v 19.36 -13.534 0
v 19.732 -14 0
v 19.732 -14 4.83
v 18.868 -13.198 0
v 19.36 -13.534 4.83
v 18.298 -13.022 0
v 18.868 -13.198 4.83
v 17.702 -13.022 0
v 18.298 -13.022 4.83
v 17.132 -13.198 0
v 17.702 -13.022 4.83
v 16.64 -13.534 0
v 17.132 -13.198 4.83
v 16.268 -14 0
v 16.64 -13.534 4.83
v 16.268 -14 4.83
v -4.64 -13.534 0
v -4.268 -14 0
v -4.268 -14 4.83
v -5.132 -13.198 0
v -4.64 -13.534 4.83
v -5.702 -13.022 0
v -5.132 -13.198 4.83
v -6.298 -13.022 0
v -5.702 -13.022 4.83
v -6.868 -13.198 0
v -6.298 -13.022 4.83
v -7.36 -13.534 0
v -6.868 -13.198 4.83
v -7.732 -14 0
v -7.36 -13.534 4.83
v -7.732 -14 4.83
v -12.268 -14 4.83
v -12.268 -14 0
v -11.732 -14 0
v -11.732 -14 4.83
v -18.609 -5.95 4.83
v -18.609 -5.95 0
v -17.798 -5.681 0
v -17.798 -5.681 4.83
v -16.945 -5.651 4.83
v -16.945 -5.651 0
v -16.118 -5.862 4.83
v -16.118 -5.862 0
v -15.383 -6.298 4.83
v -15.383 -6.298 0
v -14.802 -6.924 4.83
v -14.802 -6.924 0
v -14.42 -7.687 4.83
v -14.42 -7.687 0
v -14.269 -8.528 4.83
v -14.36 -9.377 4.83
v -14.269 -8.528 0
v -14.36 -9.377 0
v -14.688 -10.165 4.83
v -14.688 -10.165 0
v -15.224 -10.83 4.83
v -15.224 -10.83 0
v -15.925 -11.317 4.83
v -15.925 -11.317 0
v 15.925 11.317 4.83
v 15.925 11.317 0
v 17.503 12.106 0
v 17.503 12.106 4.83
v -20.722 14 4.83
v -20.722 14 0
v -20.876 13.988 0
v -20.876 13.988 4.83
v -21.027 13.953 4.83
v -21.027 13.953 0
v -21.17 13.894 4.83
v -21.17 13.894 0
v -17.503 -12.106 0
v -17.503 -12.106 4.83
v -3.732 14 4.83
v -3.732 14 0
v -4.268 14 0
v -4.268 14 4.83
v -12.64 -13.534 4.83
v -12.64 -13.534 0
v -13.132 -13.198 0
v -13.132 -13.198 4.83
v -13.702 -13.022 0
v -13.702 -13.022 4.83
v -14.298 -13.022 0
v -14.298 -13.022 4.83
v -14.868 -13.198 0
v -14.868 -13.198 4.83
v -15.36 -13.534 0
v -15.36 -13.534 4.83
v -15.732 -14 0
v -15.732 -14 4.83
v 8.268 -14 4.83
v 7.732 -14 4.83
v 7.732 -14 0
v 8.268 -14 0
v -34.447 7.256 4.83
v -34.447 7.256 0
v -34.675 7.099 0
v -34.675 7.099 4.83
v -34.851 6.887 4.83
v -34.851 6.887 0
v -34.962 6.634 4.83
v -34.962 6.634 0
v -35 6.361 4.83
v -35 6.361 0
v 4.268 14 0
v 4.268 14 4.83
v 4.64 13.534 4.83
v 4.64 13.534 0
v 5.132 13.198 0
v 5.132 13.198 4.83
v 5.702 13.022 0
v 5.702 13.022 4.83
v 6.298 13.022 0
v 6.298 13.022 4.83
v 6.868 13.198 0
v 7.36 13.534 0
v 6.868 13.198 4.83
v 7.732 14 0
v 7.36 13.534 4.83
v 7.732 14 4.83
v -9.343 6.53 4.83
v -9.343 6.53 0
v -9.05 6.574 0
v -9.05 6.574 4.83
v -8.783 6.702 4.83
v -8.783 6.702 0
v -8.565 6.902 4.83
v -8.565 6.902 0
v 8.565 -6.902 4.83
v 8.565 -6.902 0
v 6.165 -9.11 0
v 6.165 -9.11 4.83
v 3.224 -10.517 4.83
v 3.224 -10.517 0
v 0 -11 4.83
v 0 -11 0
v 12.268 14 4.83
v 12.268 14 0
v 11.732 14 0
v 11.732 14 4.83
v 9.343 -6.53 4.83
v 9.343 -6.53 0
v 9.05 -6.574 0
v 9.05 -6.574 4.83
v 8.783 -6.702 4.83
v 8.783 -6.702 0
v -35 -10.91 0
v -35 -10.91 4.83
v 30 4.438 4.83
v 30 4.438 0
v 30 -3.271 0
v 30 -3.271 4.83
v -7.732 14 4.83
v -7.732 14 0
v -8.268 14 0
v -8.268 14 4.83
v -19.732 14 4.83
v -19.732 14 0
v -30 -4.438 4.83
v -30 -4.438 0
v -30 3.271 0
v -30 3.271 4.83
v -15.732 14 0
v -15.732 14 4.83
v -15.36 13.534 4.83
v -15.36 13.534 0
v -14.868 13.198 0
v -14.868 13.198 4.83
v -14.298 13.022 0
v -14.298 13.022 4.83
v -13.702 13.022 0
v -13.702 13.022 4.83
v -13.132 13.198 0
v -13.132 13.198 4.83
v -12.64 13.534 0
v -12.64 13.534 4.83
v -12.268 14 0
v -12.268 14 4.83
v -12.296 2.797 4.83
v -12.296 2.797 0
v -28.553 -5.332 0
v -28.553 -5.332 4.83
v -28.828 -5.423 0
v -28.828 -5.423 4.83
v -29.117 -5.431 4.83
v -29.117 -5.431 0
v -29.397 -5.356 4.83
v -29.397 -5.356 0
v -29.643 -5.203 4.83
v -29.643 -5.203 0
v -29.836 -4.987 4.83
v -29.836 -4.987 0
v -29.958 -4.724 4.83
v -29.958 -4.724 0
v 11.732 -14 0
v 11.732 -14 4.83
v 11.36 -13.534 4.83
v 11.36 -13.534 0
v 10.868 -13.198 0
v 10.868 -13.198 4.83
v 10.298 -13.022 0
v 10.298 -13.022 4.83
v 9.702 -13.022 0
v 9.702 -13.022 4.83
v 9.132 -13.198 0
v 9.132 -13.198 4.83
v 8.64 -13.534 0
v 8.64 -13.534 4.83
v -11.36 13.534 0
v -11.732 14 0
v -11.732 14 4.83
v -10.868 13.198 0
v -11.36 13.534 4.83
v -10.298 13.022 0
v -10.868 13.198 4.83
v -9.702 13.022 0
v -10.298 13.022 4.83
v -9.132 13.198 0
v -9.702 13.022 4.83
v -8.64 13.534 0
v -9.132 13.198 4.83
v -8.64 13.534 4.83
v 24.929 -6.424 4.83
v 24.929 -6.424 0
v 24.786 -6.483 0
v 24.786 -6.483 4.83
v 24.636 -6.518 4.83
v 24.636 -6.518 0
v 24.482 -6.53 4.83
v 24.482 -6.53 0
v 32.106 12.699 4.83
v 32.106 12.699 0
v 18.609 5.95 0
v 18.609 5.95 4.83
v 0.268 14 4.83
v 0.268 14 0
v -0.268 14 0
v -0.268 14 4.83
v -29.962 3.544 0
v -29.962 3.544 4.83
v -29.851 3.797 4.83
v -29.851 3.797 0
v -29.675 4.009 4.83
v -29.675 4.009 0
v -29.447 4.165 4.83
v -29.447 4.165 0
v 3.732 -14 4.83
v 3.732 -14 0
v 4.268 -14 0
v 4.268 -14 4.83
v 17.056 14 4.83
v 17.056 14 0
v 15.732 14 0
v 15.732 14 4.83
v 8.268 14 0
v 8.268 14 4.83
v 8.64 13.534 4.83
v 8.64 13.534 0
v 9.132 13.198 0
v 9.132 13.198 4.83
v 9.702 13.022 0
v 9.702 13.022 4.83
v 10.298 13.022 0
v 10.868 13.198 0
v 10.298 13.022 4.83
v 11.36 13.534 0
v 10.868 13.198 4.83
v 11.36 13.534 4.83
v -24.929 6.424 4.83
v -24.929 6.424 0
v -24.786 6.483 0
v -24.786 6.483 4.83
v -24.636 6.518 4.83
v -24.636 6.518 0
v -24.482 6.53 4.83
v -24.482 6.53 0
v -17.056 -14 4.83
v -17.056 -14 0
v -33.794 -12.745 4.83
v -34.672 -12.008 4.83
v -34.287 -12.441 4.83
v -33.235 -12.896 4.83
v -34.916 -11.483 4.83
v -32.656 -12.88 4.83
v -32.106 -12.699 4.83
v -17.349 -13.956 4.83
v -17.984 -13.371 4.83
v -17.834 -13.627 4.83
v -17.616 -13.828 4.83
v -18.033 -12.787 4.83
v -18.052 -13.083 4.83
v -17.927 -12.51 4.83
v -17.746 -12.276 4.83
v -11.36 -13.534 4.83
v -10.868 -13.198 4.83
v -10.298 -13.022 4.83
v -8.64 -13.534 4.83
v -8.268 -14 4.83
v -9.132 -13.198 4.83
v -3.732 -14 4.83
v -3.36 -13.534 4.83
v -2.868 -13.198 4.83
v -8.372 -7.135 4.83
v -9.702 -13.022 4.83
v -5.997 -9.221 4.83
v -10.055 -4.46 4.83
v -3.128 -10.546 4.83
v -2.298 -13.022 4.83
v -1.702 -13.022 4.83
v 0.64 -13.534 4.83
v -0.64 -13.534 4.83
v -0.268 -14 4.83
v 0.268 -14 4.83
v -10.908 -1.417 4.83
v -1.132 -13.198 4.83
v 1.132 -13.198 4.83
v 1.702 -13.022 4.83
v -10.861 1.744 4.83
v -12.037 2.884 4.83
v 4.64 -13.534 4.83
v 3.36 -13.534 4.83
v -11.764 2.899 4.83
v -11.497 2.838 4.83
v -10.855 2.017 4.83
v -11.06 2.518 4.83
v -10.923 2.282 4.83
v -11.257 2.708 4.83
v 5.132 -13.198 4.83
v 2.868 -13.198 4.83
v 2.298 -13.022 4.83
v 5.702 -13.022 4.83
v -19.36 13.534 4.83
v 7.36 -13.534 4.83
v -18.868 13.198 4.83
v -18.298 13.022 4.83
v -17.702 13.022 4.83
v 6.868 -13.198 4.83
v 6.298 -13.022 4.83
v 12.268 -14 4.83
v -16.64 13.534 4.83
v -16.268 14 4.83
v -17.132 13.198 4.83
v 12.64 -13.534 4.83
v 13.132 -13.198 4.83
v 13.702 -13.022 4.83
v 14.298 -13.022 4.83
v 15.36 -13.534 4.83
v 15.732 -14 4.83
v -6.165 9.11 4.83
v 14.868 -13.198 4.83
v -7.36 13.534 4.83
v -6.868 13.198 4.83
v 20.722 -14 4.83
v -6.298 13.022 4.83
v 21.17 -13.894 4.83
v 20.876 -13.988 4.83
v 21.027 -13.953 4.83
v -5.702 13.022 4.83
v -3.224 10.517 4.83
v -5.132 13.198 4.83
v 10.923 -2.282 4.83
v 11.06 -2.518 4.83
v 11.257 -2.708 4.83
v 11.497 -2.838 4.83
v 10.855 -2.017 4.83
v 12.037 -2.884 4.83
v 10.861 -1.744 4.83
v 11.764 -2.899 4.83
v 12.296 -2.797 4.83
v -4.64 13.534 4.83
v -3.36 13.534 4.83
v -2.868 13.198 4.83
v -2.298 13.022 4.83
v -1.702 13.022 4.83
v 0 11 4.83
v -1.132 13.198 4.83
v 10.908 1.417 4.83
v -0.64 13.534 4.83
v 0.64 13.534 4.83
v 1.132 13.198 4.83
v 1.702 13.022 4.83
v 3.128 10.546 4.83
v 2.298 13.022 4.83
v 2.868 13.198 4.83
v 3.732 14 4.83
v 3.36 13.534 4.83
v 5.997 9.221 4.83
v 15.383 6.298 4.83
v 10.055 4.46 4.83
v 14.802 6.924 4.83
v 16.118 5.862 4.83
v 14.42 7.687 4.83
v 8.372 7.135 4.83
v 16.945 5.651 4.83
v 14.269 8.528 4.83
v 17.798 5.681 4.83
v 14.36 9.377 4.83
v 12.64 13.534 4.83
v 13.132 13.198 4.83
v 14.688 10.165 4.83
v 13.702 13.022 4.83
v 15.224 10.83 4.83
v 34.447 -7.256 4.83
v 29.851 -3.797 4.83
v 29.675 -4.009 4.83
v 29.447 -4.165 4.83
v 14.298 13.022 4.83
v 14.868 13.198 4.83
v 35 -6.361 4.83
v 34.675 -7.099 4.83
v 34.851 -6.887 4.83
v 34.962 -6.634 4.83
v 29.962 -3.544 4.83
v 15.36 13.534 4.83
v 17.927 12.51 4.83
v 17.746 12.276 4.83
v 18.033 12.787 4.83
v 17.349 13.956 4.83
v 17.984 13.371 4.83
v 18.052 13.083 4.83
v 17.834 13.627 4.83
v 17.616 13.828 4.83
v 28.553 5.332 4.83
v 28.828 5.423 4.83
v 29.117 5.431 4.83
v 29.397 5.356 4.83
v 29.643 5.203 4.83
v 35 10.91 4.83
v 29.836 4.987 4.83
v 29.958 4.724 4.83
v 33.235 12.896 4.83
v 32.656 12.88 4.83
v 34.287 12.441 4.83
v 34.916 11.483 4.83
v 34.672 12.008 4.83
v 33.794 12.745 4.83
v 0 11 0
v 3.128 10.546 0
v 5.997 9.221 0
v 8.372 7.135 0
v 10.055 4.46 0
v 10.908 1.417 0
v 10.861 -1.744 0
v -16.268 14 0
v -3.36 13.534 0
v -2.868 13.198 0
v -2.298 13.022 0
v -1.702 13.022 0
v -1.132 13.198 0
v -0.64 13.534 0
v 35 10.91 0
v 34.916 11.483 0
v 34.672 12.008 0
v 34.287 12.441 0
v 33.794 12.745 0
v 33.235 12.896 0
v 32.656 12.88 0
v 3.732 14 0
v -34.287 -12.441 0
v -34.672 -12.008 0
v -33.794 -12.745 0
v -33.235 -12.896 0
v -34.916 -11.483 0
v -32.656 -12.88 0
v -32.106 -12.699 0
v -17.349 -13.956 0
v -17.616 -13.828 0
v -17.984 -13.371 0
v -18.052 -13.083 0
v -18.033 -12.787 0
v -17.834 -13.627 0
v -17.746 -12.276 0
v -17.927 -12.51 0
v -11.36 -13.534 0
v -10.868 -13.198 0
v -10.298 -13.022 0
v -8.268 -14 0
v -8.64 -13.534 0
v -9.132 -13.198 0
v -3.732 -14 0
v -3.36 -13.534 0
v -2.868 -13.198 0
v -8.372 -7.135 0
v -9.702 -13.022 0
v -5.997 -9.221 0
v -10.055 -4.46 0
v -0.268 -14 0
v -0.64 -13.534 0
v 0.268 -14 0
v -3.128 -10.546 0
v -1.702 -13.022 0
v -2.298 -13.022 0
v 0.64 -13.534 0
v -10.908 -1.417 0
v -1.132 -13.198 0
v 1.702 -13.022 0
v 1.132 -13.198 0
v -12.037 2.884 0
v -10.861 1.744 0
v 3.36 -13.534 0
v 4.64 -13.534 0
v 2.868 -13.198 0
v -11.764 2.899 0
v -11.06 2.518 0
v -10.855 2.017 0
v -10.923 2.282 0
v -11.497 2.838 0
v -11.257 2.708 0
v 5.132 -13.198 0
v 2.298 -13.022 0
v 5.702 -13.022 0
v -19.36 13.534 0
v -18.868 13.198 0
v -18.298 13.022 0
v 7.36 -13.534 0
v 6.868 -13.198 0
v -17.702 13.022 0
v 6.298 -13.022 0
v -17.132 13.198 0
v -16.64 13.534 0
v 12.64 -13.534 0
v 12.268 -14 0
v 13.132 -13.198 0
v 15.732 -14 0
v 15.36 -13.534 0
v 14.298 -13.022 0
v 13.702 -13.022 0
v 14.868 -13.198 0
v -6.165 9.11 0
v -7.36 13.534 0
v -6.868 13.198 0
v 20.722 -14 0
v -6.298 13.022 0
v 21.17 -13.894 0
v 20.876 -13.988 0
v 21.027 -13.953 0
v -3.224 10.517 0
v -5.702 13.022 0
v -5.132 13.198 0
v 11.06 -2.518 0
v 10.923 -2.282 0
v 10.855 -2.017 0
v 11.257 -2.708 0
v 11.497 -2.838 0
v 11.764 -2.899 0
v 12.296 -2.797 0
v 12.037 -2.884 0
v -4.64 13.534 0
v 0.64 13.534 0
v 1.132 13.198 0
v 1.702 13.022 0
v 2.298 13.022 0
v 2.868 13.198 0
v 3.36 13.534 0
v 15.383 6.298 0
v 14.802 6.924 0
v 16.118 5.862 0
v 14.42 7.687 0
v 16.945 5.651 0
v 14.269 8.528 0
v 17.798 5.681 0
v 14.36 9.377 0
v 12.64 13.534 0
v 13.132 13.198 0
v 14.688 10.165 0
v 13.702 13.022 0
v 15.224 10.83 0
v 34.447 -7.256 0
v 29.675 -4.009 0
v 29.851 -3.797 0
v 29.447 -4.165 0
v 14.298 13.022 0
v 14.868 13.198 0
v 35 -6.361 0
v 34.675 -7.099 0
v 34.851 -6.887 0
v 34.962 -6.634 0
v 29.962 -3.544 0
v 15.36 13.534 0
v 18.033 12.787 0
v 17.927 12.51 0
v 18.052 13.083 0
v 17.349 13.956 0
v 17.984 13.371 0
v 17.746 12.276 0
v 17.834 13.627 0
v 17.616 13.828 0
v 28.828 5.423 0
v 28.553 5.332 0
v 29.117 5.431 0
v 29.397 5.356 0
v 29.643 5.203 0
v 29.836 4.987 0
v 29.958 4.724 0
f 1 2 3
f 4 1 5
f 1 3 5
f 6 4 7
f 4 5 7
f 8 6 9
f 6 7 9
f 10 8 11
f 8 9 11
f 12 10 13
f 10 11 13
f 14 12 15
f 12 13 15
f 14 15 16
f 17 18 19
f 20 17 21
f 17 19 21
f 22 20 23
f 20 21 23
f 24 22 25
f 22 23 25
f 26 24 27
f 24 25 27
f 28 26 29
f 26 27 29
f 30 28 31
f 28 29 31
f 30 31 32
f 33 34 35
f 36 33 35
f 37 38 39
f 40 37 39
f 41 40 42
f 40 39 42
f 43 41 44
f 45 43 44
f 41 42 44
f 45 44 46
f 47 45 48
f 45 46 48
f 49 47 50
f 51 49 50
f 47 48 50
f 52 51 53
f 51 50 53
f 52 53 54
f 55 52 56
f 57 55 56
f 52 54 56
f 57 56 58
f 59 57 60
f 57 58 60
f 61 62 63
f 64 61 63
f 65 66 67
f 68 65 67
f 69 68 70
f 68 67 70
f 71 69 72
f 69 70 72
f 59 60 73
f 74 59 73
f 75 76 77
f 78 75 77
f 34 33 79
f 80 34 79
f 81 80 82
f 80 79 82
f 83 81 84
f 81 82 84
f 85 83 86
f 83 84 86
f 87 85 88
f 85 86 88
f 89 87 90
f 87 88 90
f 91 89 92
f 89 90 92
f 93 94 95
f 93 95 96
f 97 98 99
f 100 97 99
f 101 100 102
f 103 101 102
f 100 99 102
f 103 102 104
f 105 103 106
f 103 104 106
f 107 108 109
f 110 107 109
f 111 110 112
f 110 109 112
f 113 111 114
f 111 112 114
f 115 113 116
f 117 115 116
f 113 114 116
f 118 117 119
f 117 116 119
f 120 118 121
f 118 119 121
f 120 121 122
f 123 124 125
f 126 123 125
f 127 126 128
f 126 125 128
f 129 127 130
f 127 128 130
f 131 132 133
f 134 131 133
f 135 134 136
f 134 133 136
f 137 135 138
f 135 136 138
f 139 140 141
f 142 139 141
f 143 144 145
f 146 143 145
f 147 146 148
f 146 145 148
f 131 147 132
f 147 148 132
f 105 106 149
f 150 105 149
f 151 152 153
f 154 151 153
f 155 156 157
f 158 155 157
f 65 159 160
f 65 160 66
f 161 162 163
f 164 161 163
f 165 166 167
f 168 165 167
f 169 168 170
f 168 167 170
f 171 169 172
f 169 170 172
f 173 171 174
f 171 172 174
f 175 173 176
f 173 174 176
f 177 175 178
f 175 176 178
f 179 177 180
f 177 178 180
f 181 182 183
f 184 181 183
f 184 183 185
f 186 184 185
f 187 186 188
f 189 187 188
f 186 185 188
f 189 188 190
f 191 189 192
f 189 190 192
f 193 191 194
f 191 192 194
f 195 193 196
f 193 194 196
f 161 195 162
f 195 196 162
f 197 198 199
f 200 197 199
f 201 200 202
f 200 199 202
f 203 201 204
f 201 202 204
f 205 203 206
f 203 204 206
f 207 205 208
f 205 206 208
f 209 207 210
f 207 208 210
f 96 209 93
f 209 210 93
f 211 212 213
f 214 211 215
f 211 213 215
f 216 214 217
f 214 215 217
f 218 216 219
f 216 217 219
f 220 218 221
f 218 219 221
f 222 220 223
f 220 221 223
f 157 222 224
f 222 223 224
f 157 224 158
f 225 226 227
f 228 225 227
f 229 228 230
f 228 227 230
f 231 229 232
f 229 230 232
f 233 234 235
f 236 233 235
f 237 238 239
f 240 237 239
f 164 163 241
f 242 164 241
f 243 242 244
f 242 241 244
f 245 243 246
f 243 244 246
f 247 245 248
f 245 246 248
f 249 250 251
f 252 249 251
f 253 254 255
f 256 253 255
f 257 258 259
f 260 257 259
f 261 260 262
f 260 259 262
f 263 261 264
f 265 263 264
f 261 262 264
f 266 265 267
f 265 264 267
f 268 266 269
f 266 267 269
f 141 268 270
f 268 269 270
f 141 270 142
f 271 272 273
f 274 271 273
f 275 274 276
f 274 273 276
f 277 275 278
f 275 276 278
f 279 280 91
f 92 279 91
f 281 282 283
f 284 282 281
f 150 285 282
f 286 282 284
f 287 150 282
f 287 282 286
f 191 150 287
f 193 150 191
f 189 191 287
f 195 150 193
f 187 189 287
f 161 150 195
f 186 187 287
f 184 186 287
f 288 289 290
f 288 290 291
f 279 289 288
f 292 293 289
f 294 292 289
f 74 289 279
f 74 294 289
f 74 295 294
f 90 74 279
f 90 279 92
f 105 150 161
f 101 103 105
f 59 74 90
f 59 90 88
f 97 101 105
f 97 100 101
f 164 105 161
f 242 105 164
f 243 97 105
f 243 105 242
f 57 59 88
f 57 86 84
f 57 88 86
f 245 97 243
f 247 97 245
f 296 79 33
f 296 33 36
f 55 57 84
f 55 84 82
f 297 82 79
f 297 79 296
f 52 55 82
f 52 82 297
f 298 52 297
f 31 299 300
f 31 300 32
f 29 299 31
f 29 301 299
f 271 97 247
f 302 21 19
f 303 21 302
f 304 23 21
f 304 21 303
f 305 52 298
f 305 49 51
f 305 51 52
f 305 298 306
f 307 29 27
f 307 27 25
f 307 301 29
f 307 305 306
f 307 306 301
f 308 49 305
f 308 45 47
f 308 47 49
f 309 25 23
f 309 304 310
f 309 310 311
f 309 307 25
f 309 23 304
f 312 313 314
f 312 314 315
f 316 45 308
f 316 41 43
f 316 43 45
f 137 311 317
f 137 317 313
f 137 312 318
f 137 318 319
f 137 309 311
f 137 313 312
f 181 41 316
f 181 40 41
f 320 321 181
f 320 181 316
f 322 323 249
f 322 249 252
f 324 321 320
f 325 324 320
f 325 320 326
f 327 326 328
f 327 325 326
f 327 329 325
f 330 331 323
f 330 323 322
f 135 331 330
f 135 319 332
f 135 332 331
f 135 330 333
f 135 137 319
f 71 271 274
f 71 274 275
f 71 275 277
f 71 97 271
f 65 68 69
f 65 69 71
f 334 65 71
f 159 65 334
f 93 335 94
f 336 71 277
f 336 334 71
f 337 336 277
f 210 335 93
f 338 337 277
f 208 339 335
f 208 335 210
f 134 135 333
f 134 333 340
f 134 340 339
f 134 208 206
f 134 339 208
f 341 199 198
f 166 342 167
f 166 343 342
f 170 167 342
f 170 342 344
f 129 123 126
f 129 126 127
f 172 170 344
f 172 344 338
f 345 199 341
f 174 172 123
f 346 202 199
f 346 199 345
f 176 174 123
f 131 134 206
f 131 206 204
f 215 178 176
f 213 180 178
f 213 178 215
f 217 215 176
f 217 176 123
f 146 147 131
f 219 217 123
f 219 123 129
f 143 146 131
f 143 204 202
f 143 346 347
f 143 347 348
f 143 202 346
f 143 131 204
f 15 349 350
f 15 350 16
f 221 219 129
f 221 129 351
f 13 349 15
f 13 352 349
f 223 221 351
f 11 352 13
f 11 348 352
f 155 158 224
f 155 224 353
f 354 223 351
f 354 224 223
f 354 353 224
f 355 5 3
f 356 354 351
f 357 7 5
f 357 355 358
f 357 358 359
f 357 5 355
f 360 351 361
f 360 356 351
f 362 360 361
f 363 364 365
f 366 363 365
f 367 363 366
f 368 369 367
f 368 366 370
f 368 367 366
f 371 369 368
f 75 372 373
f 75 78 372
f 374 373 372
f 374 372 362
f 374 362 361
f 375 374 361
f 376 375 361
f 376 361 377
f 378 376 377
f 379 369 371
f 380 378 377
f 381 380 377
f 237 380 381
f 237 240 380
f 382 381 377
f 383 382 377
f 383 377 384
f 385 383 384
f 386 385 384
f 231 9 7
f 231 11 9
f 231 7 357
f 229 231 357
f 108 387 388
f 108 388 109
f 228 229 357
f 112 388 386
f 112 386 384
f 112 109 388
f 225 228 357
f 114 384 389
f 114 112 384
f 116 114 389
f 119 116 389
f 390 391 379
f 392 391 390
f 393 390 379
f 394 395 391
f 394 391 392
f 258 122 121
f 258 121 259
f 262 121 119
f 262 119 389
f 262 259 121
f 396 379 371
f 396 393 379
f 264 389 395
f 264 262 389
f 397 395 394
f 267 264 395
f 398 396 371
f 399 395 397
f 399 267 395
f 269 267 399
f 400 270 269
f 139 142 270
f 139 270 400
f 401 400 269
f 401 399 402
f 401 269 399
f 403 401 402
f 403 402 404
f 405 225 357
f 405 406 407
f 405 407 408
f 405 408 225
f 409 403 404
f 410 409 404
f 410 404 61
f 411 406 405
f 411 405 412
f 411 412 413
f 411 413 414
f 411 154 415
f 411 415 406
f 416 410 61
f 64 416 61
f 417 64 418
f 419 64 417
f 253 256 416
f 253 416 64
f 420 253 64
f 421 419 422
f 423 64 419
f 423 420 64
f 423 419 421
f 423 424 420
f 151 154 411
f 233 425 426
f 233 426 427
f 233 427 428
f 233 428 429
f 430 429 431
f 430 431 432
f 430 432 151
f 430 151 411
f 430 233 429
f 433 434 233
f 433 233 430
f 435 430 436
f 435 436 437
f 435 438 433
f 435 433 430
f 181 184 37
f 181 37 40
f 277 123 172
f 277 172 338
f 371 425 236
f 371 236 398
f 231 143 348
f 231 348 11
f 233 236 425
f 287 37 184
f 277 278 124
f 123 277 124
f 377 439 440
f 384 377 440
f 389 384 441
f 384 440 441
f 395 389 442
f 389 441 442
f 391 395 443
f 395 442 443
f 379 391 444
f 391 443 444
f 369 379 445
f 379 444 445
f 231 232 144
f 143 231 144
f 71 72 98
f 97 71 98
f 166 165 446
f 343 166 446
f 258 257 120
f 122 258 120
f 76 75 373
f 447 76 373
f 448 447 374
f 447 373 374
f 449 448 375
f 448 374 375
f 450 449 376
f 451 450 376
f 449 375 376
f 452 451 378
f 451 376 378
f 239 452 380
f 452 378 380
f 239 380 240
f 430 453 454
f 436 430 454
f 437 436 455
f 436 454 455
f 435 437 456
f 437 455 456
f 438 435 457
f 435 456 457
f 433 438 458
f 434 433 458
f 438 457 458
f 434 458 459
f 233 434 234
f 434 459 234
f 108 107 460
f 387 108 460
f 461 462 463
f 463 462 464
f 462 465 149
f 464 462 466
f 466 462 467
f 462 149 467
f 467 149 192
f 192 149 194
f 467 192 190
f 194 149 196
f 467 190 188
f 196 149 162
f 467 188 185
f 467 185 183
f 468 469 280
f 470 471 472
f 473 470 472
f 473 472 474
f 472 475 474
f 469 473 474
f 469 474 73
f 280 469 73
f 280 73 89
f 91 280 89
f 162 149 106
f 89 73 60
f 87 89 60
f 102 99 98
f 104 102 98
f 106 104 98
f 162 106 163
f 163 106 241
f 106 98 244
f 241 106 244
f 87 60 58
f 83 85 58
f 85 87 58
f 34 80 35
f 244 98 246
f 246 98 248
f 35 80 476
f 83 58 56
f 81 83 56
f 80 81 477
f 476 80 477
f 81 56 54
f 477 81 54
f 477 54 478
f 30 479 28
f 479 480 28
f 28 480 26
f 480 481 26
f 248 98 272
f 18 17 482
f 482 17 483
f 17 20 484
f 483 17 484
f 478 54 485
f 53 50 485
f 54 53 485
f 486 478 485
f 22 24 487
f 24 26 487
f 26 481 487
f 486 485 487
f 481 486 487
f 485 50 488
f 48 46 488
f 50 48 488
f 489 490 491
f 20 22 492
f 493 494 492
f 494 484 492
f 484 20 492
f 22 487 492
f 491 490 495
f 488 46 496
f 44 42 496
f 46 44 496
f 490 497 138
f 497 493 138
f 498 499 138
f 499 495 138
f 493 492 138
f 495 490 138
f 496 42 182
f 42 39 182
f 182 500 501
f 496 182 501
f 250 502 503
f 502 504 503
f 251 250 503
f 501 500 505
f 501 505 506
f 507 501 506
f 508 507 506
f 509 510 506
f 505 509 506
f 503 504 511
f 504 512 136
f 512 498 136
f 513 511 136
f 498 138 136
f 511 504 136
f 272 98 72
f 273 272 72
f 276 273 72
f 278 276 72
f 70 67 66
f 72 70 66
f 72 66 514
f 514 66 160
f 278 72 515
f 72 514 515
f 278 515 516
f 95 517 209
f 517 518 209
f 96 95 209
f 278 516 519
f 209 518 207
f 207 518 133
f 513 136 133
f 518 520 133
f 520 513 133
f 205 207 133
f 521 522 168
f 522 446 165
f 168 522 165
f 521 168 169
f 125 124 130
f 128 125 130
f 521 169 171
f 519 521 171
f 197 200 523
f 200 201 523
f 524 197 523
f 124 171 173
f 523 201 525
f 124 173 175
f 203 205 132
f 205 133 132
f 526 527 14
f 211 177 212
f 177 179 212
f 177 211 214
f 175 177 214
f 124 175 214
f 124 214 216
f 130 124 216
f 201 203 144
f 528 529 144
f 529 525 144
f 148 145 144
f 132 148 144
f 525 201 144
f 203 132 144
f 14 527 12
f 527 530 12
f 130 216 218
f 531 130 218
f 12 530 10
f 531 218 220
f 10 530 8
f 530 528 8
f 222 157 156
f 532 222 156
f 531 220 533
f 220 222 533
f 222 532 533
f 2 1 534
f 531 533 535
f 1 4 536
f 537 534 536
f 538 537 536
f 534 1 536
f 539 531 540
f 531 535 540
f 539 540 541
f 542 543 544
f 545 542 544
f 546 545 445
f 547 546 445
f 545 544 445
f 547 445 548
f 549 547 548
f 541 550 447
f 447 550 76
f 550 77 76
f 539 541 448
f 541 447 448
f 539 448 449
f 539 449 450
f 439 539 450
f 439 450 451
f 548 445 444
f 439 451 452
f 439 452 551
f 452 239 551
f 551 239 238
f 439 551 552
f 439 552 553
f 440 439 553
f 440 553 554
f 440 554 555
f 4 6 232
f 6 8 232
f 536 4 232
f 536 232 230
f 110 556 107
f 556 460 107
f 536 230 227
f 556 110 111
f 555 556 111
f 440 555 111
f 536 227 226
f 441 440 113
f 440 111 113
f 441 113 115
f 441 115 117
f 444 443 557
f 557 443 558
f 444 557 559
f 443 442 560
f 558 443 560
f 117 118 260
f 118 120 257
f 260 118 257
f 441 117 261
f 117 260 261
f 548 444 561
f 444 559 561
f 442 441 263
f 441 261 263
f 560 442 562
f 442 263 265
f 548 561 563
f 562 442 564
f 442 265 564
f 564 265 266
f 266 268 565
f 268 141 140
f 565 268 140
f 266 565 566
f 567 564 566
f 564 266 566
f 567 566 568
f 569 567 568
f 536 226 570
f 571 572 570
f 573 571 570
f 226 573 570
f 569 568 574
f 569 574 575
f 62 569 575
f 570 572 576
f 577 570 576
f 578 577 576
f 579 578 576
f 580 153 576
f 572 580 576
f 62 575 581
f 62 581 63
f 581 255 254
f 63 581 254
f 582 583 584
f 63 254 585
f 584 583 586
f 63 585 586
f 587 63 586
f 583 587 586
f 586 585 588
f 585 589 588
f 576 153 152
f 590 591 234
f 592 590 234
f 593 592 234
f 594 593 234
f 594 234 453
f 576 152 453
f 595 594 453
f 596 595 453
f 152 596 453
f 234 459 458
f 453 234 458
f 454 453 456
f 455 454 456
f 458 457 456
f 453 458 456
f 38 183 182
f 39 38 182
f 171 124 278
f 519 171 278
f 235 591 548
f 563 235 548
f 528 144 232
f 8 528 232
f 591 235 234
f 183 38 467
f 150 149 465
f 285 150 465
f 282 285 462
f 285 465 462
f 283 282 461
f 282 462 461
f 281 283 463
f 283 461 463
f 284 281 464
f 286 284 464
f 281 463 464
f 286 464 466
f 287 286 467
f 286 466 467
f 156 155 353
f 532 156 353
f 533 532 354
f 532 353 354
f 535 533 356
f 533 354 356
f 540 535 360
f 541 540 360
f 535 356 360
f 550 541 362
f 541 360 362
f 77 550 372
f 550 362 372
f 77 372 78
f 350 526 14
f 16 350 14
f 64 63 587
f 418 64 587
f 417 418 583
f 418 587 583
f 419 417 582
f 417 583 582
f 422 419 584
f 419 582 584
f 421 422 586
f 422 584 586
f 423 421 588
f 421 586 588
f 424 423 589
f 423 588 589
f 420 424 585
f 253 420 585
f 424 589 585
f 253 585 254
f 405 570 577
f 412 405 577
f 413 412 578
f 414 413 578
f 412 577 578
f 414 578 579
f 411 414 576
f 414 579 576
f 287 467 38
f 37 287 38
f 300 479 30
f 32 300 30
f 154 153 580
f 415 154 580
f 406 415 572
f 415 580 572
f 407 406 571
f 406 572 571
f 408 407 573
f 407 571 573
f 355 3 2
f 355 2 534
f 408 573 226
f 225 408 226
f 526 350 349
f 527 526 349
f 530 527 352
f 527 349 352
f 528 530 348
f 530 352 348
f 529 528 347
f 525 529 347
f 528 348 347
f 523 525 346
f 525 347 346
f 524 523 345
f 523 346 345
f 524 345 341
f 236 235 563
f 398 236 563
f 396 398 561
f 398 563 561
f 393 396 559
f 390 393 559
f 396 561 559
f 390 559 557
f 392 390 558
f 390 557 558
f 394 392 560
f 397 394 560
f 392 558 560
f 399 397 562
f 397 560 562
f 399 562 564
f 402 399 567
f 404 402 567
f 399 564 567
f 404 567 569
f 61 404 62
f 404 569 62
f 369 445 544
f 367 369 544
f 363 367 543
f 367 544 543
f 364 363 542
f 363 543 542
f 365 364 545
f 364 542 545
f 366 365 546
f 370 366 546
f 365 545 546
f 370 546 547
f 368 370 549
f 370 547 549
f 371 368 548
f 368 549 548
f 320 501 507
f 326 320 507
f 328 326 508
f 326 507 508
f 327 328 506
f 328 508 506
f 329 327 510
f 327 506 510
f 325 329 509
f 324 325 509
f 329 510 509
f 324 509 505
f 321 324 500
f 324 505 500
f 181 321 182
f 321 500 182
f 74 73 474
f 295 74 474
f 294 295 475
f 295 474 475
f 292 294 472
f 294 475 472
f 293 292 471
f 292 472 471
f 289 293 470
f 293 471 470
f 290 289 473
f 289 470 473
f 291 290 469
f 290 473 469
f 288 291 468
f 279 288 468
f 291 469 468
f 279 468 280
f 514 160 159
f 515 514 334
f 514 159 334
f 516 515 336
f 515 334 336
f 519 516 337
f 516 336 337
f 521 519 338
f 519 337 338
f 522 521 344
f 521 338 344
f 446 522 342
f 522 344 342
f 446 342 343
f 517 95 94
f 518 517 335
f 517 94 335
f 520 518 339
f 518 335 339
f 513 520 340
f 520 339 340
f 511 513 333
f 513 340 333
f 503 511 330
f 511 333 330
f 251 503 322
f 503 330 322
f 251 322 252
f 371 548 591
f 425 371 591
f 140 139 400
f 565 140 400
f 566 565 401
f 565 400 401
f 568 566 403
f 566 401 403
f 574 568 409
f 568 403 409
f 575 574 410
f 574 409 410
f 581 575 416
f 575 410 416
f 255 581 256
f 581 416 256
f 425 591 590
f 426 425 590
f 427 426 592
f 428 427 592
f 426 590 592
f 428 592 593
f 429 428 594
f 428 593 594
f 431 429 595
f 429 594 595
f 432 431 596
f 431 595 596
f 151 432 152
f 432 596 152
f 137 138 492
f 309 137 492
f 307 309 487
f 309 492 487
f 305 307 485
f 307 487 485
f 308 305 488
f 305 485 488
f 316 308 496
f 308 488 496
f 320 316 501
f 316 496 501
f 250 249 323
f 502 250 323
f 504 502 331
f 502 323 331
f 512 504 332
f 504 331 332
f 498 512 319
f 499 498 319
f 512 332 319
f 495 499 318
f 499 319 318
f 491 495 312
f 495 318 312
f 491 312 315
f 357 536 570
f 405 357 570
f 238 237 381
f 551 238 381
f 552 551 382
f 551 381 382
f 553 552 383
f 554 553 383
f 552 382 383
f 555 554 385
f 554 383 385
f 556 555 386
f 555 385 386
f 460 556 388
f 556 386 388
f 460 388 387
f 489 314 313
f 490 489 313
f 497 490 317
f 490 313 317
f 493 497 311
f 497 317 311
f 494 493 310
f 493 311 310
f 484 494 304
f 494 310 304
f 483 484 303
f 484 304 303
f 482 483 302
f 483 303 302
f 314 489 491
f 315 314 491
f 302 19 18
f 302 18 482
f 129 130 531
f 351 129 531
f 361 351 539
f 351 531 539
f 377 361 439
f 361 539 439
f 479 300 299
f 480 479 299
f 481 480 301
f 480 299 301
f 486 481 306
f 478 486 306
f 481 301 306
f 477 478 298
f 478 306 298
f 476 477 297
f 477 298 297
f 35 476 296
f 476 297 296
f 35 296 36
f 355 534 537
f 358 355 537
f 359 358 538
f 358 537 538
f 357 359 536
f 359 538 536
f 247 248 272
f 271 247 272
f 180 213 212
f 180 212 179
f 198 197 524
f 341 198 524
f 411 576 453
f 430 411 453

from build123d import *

# Parameters (mm, degrees)
F1_DEPTH = 4.83
F2_R     = 2
F3_DEPTH = 25


with BuildPart() as f1:
    # F0 (on Top) → F1 (new body)
    with BuildSketch(Plane.XY):
        with BuildLine():
            Line((-17.055728, -14), (0, -14))
            Line((0, -14), (20.722462, -14))
            ThreePointArc((20.722462, -14), (20.952215, -13.973249), (21.169675, -13.894427))
            Line((21.169675, -13.894427), (34.447214, -7.255658))
            ThreePointArc((34.447214, -7.255658), (34.850651, -6.886962), (35, -6.361231))
            Line((35, -6.361231), (35, 10.90983))
            ThreePointArc((35, 10.90983), (34.051462, 12.611132), (32.105573, 12.698684))
            Line((32.105573, 12.698684), (18.608514, 5.950155))
            ThreePointArc((18.608514, 5.950155), (14.583592, 7.291796), (15.925233, 11.316718))
            Line((15.925233, 11.316718), (17.502942, 12.105573))
            ThreePointArc((17.502942, 12.105573), (18.028977, 13.229753), (17.055728, 14))
            Line((17.055728, 14), (0, 14))
            Line((0, 14), (-20.722462, 14))
            ThreePointArc((-20.722462, 14), (-20.952215, 13.973249), (-21.169675, 13.894427))
            Line((-21.169675, 13.894427), (-34.447214, 7.255658))
            ThreePointArc((-34.447214, 7.255658), (-34.850651, 6.886962), (-35, 6.361231))
            Line((-35, 6.361231), (-35, -10.90983))
            ThreePointArc((-35, -10.90983), (-34.051462, -12.611132), (-32.105573, -12.698684))
            Line((-32.105573, -12.698684), (-18.608514, -5.950155))
            ThreePointArc((-18.608514, -5.950155), (-14.583592, -7.291796), (-15.925233, -11.316718))
            Line((-15.925233, -11.316718), (-17.502942, -12.105573))
            ThreePointArc((-17.502942, -12.105573), (-18.028977, -13.229753), (-17.055728, -14))
        make_face()
        with BuildLine():
            ThreePointArc((0, -11), (-8.37196, -7.135145), (-10.860935, 1.743584))
            ThreePointArc((-10.860935, 1.743584), (-11.256595, 2.708251), (-12.295507, 2.796519))
            Line((-12.295507, 2.796519), (-28.552786, -5.332121))
            ThreePointArc((-28.552786, -5.332121), (-29.525731, -5.288345), (-30, -4.437694))
            Line((-30, -4.437694), (-30, 3.271061))
            ThreePointArc((-30, 3.271061), (-29.850651, 3.796792), (-29.447214, 4.165488))
            Line((-29.447214, 4.165488), (-24.92942, 6.424385))
            ThreePointArc((-24.92942, 6.424385), (-24.711959, 6.503207), (-24.482206, 6.529958))
            Line((-24.482206, 6.529958), (-9.343433, 6.529958))
            ThreePointArc((-9.343433, 6.529958), (-8.911864, 6.627878), (-8.564813, 6.902461))
            ThreePointArc((-8.564813, 6.902461), (-4.747259, 9.922879), (0, 11))
            ThreePointArc((0, 11), (8.37196, 7.135145), (10.860935, -1.743584))
            ThreePointArc((10.860935, -1.743584), (11.256595, -2.708251), (12.295507, -2.796519))
            Line((12.295507, -2.796519), (28.552786, 5.332121))
            ThreePointArc((28.552786, 5.332121), (29.525731, 5.288345), (30, 4.437694))
            Line((30, 4.437694), (30, -3.271061))
            ThreePointArc((30, -3.271061), (29.850651, -3.796792), (29.447214, -4.165488))
            Line((29.447214, -4.165488), (24.92942, -6.424385))
            ThreePointArc((24.92942, -6.424385), (24.711959, -6.503207), (24.482206, -6.529958))
            Line((24.482206, -6.529958), (9.343433, -6.529958))
            ThreePointArc((9.343433, -6.529958), (8.911864, -6.627878), (8.564813, -6.902461))
            ThreePointArc((8.564813, -6.902461), (4.747259, -9.922879), (0, -11))
        make_face(mode=Mode.SUBTRACT)
    extrude(amount=F1_DEPTH)

    # F2 (on face) → F3 (cut)
    with BuildSketch(Plane.XY.offset(4.83)):
        with Locations((-18, 15)):
            Circle(F2_R)
        with BuildLine():
            ThreePointArc((16, 15), (14, 17), (12, 15))
            ThreePointArc((12, 15), (14, 13), (16, 15))
        make_face()
        with BuildLine():
            ThreePointArc((12, 15), (10, 17), (8, 15))
            ThreePointArc((8, 15), (10, 13), (12, 15))
        make_face()
        with BuildLine():
            ThreePointArc((8, 15), (6, 17), (4, 15))
            ThreePointArc((4, 15), (6, 13), (8, 15))
        make_face()
        with BuildLine():
            ThreePointArc((4, 15), (2, 17), (0, 15))
            ThreePointArc((0, 15), (2, 13), (4, 15))
        make_face()
        with BuildLine():
            ThreePointArc((0, 15), (-2, 17), (-4, 15))
            ThreePointArc((-4, 15), (-2, 13), (0, 15))
        make_face()
        with BuildLine():
            ThreePointArc((-4, 15), (-6, 17), (-8, 15))
            ThreePointArc((-8, 15), (-6, 13), (-4, 15))
        make_face()
        with BuildLine():
            ThreePointArc((-8, 15), (-10, 17), (-12, 15))
            ThreePointArc((-12, 15), (-10, 13), (-8, 15))
        make_face()
        with BuildLine():
            ThreePointArc((-12, 15), (-14, 17), (-16, 15))
            ThreePointArc((-16, 15), (-14, 13), (-12, 15))
        make_face()
        with BuildLine():
            ThreePointArc((0, -15), (2, -17), (4, -15))
            ThreePointArc((4, -15), (2, -13), (0, -15))
        make_face()
        with Locations((-14, -15)):
            Circle(F2_R)
        with BuildLine():
            ThreePointArc((-12, -15), (-10, -17), (-8, -15))
            ThreePointArc((-8, -15), (-10, -13), (-12, -15))
        make_face()
        with BuildLine():
            ThreePointArc((-8, -15), (-6, -17), (-4, -15))
            ThreePointArc((-4, -15), (-6, -13), (-8, -15))
        make_face()
        with BuildLine():
            ThreePointArc((-4, -15), (-2, -17), (0, -15))
            ThreePointArc((0, -15), (-2, -13), (-4, -15))
        make_face()
        with BuildLine():
            ThreePointArc((20, -15), (18, -13), (16, -15))
            ThreePointArc((16, -15), (18, -17), (20, -15))
        make_face()
        with BuildLine():
            ThreePointArc((16, -15), (14, -13), (12, -15))
            ThreePointArc((12, -15), (14, -17), (16, -15))
        make_face()
        with BuildLine():
            ThreePointArc((12, -15), (10, -13), (8, -15))
            ThreePointArc((8, -15), (10, -17), (12, -15))
        make_face()
        with BuildLine():
            ThreePointArc((8, -15), (6, -13), (4, -15))
            ThreePointArc((4, -15), (6, -17), (8, -15))
        make_face()
    extrude(amount=-F3_DEPTH, mode=Mode.SUBTRACT)


solid = f1.part
